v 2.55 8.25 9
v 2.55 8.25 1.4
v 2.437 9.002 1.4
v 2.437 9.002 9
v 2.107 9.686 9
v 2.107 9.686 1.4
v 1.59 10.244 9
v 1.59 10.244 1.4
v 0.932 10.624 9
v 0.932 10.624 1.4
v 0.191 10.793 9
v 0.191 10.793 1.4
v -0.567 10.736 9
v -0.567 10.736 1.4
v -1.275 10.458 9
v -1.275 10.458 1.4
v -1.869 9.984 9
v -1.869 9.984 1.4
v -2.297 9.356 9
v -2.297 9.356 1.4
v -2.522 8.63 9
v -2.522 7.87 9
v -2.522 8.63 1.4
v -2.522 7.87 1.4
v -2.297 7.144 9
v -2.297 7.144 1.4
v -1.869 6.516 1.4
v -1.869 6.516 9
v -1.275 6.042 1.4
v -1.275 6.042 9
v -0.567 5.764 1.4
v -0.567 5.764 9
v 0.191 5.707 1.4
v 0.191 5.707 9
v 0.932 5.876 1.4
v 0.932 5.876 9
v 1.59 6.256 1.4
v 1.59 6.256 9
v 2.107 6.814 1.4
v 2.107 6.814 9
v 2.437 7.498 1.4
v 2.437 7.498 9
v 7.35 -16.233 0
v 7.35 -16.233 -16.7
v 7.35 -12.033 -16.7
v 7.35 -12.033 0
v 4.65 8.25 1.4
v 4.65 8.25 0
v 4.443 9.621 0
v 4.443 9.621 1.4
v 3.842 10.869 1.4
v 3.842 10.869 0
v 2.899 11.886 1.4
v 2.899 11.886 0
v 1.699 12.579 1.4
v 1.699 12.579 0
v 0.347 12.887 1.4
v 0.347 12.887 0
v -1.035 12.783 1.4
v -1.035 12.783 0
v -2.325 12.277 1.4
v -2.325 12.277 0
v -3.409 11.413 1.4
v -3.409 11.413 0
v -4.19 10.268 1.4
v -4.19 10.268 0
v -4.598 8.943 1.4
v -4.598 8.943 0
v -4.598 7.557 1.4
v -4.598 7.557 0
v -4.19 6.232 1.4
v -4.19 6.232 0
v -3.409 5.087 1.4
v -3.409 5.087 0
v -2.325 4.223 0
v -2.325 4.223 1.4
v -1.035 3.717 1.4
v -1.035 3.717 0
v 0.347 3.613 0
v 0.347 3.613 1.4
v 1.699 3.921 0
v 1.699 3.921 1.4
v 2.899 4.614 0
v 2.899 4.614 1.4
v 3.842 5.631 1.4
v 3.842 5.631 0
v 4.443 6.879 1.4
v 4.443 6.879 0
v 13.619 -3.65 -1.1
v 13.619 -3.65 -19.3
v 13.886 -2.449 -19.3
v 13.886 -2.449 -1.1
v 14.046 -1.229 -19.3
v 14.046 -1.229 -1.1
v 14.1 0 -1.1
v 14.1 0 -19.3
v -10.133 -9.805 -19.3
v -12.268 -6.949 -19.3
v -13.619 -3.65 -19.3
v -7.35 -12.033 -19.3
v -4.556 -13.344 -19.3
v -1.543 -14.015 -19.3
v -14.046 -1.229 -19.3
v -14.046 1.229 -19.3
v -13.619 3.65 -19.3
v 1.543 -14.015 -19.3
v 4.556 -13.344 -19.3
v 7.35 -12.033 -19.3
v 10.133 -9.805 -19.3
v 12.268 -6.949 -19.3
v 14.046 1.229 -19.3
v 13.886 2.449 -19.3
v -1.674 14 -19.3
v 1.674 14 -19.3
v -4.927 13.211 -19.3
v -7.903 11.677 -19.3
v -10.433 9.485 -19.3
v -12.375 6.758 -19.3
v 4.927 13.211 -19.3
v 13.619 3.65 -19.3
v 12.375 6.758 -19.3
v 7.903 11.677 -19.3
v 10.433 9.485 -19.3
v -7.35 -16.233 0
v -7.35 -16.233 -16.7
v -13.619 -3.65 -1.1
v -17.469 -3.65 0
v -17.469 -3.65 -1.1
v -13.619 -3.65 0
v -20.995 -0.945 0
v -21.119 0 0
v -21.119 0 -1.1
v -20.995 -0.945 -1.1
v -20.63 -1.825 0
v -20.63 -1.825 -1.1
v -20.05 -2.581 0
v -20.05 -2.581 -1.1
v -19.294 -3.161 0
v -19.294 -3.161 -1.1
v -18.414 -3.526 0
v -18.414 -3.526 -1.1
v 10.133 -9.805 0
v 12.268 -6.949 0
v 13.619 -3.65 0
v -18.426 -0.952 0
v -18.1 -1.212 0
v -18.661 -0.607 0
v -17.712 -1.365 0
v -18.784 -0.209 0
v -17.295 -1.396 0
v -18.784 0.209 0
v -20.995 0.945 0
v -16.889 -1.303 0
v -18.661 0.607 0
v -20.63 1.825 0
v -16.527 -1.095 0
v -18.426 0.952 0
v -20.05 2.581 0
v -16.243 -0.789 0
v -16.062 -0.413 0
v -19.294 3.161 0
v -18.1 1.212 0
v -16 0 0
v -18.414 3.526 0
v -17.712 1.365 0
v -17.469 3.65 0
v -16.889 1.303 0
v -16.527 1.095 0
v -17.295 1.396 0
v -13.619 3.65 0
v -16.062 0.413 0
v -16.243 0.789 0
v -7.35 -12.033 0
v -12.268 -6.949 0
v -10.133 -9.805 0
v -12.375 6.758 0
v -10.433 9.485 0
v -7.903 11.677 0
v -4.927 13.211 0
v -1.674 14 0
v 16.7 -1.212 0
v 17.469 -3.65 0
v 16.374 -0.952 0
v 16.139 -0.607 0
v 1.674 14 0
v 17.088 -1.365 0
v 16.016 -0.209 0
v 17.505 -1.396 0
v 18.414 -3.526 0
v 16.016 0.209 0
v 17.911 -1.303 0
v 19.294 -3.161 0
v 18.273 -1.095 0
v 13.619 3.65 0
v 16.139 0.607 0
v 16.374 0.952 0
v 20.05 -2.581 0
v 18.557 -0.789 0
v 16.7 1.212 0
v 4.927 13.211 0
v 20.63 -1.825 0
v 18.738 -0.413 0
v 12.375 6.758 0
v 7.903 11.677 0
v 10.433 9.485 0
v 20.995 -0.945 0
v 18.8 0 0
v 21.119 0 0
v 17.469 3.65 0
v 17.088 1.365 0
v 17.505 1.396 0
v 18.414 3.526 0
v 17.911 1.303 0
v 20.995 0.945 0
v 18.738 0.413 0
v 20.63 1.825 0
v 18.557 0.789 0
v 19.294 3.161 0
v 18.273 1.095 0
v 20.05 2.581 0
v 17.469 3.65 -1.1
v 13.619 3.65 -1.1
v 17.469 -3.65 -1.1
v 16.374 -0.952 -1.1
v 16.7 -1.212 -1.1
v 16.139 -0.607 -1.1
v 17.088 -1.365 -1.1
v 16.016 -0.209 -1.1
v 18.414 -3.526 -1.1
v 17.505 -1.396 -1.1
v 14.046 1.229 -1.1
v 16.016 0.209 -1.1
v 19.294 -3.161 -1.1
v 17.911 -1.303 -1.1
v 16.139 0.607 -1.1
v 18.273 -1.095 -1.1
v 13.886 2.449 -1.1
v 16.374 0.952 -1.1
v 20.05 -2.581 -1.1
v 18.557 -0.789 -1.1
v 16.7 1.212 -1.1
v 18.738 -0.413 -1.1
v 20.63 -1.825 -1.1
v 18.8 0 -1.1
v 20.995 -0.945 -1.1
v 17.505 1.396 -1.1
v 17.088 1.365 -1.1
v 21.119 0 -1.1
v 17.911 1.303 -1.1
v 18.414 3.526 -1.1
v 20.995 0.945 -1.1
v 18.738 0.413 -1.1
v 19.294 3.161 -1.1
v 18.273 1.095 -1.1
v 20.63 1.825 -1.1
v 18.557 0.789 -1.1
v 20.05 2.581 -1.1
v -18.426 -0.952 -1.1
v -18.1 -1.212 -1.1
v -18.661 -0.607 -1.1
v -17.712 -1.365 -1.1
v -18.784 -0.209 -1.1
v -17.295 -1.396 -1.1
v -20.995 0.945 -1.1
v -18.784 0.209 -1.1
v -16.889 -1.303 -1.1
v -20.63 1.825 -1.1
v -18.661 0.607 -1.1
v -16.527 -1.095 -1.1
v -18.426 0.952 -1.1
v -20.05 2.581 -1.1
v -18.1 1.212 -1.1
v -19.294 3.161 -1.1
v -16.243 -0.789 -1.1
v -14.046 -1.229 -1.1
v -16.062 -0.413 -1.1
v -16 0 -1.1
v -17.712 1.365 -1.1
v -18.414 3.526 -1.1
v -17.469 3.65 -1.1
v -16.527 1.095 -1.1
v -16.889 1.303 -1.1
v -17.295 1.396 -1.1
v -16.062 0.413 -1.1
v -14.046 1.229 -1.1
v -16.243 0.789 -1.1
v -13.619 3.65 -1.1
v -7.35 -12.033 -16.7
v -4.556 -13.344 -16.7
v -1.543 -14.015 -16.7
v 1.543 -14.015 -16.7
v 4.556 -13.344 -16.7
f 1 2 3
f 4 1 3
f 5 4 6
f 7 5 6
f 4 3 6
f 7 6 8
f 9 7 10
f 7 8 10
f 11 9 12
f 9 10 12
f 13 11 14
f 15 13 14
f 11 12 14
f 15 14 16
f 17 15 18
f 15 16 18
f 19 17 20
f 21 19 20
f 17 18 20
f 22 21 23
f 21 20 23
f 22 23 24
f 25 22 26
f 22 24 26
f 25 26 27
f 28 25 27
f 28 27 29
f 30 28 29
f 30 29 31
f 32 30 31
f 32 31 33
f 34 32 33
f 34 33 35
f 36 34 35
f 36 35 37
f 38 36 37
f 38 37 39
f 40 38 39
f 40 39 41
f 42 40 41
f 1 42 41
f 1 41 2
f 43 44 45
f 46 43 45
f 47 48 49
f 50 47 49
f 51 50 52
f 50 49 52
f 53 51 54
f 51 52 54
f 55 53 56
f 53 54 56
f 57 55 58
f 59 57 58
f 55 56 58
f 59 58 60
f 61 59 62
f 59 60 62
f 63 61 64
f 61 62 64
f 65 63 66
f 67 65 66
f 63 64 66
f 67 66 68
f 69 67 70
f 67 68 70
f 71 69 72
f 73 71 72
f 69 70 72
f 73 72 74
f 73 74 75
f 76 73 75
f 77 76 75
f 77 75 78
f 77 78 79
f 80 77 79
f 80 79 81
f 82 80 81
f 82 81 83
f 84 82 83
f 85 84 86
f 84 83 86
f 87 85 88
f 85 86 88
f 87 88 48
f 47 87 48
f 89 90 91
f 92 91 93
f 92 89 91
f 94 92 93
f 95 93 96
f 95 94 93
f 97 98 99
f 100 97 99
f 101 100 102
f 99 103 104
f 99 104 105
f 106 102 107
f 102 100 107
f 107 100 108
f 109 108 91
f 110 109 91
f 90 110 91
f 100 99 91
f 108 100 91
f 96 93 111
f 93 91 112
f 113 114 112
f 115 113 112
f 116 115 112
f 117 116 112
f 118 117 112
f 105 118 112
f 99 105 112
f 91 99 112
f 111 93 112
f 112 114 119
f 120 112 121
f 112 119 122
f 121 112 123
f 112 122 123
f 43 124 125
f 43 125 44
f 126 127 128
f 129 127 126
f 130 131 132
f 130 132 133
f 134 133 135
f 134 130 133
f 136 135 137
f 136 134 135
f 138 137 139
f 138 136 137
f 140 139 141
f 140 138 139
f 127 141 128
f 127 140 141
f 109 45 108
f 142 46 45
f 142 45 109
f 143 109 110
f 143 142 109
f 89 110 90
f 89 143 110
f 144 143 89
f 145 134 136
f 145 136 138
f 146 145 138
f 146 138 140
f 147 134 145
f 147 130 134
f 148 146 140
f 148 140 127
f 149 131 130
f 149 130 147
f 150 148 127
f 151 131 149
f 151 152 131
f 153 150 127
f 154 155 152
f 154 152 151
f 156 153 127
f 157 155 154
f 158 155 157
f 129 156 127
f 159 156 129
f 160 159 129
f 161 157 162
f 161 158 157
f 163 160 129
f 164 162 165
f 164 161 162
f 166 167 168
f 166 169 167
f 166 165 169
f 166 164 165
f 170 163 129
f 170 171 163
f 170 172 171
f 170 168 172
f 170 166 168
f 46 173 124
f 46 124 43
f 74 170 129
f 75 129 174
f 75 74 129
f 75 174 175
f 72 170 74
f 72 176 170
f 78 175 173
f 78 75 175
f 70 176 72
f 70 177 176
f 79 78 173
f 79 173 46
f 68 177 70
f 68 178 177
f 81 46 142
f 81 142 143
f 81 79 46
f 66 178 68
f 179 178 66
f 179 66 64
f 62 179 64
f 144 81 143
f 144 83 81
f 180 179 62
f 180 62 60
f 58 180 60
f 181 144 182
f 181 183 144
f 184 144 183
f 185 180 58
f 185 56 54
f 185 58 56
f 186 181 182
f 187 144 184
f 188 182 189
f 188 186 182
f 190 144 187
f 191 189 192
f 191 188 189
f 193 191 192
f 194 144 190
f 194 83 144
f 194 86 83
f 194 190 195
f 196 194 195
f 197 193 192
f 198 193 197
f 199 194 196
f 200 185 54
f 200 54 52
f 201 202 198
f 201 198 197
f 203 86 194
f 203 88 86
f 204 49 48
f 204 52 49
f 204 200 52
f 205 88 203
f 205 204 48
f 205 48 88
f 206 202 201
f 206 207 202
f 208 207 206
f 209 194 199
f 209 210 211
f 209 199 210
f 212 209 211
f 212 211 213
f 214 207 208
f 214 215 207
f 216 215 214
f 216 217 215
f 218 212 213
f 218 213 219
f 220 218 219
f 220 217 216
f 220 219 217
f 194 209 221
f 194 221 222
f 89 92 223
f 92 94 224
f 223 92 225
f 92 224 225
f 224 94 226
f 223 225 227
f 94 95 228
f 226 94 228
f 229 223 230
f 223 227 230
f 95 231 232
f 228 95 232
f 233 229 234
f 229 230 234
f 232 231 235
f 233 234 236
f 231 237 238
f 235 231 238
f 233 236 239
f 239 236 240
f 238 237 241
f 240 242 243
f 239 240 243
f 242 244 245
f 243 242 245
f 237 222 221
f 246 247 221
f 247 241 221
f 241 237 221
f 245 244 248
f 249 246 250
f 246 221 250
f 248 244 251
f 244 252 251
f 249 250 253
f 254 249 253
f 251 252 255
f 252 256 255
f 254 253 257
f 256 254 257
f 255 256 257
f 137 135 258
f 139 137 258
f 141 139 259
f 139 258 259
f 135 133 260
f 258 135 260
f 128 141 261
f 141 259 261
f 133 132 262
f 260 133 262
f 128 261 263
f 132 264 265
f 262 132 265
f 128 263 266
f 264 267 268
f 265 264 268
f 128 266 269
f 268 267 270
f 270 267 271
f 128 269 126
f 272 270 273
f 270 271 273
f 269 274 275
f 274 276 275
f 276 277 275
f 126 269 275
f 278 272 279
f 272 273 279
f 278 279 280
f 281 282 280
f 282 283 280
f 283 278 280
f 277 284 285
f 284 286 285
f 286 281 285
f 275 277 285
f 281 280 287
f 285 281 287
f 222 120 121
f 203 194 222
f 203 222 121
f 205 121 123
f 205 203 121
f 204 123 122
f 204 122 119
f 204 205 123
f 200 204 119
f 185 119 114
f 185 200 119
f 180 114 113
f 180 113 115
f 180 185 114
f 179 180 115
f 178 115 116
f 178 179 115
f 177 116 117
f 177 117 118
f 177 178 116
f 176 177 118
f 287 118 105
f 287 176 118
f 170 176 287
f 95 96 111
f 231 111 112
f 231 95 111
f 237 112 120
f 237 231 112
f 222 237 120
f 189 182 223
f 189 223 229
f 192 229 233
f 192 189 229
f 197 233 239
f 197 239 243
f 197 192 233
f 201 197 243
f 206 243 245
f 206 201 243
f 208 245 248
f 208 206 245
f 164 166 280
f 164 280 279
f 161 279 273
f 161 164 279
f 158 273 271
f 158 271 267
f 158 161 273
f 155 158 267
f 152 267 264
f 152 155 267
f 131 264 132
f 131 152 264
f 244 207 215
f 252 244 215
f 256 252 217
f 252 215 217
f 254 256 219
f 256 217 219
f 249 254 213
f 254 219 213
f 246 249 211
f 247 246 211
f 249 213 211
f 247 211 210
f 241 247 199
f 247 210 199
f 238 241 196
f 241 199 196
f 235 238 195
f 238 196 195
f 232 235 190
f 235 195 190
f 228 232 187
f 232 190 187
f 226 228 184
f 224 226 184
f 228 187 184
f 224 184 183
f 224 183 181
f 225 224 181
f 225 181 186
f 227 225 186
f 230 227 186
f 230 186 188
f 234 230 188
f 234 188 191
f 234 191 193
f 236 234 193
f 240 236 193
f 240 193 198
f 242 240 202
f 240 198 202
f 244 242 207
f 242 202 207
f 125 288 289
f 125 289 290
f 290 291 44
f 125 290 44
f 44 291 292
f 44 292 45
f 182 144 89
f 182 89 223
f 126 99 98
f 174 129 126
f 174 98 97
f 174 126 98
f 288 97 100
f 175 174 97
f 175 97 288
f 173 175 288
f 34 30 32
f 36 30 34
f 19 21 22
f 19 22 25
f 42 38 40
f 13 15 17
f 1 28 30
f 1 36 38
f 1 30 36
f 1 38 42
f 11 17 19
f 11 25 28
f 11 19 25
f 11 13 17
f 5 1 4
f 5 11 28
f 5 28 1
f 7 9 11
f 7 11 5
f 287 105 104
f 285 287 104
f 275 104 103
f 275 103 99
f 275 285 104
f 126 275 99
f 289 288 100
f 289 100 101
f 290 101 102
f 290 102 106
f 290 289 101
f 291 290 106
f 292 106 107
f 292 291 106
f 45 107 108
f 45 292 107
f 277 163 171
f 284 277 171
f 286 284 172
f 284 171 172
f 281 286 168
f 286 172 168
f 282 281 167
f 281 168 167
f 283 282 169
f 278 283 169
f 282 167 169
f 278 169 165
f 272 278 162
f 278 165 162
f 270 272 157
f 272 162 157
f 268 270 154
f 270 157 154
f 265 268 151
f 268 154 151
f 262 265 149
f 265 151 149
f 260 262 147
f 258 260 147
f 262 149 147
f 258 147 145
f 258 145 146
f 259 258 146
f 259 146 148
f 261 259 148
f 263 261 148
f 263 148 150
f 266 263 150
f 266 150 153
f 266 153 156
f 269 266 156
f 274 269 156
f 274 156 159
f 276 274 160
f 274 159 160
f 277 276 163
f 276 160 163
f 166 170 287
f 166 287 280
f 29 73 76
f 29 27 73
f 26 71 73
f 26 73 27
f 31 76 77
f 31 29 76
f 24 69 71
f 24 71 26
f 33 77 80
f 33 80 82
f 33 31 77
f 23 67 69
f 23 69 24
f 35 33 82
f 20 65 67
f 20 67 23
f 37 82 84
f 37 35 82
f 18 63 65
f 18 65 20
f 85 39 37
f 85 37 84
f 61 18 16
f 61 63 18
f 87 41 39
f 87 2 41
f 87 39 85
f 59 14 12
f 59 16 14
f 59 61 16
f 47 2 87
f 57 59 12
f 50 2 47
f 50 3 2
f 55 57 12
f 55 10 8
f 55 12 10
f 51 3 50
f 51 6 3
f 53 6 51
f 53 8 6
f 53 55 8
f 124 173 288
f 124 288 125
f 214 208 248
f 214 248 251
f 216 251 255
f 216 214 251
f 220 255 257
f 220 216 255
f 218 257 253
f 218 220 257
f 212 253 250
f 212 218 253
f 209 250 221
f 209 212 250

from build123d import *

# Parameters (mm, degrees)
F0_R     = 4.65
F0_R_2   = 2.55
F1_DEPTH = 1.4
F2_DEPTH = 9
F3_DEPTH = 19.3
F4_DEPTH = 16.7
F0_R_3   = 1.4
F5_DEPTH = 1.1


with BuildPart() as f1:
    # F0 (on Top) → F1 (new body)
    with BuildSketch(Plane.XY):
        with Locations((0, 8.25)):
            Circle(F0_R)
        with Locations((0, 8.25)):
            Circle(F0_R_2, mode=Mode.SUBTRACT)
    extrude(amount=F1_DEPTH)

    # F0 (on Top) → F2 (join)
    with BuildSketch(Plane.XY):
        with Locations((0, 8.25)):
            Circle(F0_R_2)
    extrude(amount=F2_DEPTH)

    # F0 (on Top) → F3 (join)
    with BuildSketch(Plane.XY):
        with BuildLine():
            ThreePointArc((-7.35, -12.0327677614), (0, -14.1), (7.35, -12.0327677614))
            Line((7.35, -12.0327677614), (-7.35, -12.0327677614))
        make_face()
        with BuildLine():
            Line((13.6193795747, -3.65), (13.6193795747, 3.65))
            ThreePointArc((13.6193795747, 3.65), (0, 14.1), (-13.6193795747, 3.65))
            ThreePointArc((-13.6193795747, 3.65), (-14.1, 0), (-13.6193795747, -3.65))
            ThreePointArc((-13.6193795747, -3.65), (-11.2914312101, -8.4447368951), (-7.35, -12.0327677614))
            Line((-7.35, -12.0327677614), (7.35, -12.0327677614))
            ThreePointArc((7.35, -12.0327677614), (11.2914312101, -8.4447368951), (13.6193795747, -3.65))
        make_face()
        with Locations((0, 8.25)):
            Circle(F0_R, mode=Mode.SUBTRACT)
        with Locations((0, 8.25)):
            Circle(F0_R)
        with Locations((0, 8.25)):
            Circle(F0_R_2, mode=Mode.SUBTRACT)
        with Locations((0, 8.25)):
            Circle(F0_R_2)
        with BuildLine():
            ThreePointArc((13.6193795747, -3.65), (13.9793285247, -1.8407536495), (14.1, 0))
            ThreePointArc((14.1, 0), (13.9793285247, 1.8407536495), (13.6193795747, 3.65))
            Line((13.6193795747, 3.65), (13.6193795747, -3.65))
        make_face()
    extrude(amount=-F3_DEPTH)

    # F0 (on Top) → F4 (join)
    with BuildSketch(Plane.XY):
        with BuildLine():
            Line((7.35, -16.2327677614), (7.35, -12.0327677614))
            ThreePointArc((7.35, -12.0327677614), (0, -14.1), (-7.35, -12.0327677614))
            Line((-7.35, -12.0327677614), (-7.35, -16.2327677614))
            Line((-7.35, -16.2327677614), (7.35, -16.2327677614))
        make_face()
    extrude(amount=-F4_DEPTH)

    # F0 (on Top) → F5 (join)
    with BuildSketch(Plane.XY):
        with BuildLine():
            ThreePointArc((-13.6193795747, -3.65), (-14.1, 0), (-13.6193795747, 3.65))
            Line((-13.6193795747, 3.65), (-17.4693795747, 3.65))
            ThreePointArc((-17.4693795747, 3.65), (-20.050319326, 2.5809397513), (-21.1193795747, 0))
            ThreePointArc((-21.1193795747, 0), (-20.050319326, -2.5809397513), (-17.4693795747, -3.65))
            Line((-17.4693795747, -3.65), (-13.6193795747, -3.65))
        make_face()
        with Locations((-17.4, 0)):
            Circle(F0_R_3, mode=Mode.SUBTRACT)
        with BuildLine():
            ThreePointArc((13.6193795747, 3.65), (13.9793285247, 1.8407536495), (14.1, 0))
            ThreePointArc((14.1, 0), (13.9793285247, -1.8407536495), (13.6193795747, -3.65))
            Line((13.6193795747, -3.65), (17.4693795747, -3.65))
            ThreePointArc((17.4693795747, -3.65), (20.050319326, -2.5809397513), (21.1193795747, 0))
            ThreePointArc((21.1193795747, 0), (20.050319326, 2.5809397513), (17.4693795747, 3.65))
            Line((17.4693795747, 3.65), (13.6193795747, 3.65))
        make_face()
        with Locations((17.4, 0)):
            Circle(F0_R_3, mode=Mode.SUBTRACT)
    extrude(amount=-F5_DEPTH)


solid = f1.part
